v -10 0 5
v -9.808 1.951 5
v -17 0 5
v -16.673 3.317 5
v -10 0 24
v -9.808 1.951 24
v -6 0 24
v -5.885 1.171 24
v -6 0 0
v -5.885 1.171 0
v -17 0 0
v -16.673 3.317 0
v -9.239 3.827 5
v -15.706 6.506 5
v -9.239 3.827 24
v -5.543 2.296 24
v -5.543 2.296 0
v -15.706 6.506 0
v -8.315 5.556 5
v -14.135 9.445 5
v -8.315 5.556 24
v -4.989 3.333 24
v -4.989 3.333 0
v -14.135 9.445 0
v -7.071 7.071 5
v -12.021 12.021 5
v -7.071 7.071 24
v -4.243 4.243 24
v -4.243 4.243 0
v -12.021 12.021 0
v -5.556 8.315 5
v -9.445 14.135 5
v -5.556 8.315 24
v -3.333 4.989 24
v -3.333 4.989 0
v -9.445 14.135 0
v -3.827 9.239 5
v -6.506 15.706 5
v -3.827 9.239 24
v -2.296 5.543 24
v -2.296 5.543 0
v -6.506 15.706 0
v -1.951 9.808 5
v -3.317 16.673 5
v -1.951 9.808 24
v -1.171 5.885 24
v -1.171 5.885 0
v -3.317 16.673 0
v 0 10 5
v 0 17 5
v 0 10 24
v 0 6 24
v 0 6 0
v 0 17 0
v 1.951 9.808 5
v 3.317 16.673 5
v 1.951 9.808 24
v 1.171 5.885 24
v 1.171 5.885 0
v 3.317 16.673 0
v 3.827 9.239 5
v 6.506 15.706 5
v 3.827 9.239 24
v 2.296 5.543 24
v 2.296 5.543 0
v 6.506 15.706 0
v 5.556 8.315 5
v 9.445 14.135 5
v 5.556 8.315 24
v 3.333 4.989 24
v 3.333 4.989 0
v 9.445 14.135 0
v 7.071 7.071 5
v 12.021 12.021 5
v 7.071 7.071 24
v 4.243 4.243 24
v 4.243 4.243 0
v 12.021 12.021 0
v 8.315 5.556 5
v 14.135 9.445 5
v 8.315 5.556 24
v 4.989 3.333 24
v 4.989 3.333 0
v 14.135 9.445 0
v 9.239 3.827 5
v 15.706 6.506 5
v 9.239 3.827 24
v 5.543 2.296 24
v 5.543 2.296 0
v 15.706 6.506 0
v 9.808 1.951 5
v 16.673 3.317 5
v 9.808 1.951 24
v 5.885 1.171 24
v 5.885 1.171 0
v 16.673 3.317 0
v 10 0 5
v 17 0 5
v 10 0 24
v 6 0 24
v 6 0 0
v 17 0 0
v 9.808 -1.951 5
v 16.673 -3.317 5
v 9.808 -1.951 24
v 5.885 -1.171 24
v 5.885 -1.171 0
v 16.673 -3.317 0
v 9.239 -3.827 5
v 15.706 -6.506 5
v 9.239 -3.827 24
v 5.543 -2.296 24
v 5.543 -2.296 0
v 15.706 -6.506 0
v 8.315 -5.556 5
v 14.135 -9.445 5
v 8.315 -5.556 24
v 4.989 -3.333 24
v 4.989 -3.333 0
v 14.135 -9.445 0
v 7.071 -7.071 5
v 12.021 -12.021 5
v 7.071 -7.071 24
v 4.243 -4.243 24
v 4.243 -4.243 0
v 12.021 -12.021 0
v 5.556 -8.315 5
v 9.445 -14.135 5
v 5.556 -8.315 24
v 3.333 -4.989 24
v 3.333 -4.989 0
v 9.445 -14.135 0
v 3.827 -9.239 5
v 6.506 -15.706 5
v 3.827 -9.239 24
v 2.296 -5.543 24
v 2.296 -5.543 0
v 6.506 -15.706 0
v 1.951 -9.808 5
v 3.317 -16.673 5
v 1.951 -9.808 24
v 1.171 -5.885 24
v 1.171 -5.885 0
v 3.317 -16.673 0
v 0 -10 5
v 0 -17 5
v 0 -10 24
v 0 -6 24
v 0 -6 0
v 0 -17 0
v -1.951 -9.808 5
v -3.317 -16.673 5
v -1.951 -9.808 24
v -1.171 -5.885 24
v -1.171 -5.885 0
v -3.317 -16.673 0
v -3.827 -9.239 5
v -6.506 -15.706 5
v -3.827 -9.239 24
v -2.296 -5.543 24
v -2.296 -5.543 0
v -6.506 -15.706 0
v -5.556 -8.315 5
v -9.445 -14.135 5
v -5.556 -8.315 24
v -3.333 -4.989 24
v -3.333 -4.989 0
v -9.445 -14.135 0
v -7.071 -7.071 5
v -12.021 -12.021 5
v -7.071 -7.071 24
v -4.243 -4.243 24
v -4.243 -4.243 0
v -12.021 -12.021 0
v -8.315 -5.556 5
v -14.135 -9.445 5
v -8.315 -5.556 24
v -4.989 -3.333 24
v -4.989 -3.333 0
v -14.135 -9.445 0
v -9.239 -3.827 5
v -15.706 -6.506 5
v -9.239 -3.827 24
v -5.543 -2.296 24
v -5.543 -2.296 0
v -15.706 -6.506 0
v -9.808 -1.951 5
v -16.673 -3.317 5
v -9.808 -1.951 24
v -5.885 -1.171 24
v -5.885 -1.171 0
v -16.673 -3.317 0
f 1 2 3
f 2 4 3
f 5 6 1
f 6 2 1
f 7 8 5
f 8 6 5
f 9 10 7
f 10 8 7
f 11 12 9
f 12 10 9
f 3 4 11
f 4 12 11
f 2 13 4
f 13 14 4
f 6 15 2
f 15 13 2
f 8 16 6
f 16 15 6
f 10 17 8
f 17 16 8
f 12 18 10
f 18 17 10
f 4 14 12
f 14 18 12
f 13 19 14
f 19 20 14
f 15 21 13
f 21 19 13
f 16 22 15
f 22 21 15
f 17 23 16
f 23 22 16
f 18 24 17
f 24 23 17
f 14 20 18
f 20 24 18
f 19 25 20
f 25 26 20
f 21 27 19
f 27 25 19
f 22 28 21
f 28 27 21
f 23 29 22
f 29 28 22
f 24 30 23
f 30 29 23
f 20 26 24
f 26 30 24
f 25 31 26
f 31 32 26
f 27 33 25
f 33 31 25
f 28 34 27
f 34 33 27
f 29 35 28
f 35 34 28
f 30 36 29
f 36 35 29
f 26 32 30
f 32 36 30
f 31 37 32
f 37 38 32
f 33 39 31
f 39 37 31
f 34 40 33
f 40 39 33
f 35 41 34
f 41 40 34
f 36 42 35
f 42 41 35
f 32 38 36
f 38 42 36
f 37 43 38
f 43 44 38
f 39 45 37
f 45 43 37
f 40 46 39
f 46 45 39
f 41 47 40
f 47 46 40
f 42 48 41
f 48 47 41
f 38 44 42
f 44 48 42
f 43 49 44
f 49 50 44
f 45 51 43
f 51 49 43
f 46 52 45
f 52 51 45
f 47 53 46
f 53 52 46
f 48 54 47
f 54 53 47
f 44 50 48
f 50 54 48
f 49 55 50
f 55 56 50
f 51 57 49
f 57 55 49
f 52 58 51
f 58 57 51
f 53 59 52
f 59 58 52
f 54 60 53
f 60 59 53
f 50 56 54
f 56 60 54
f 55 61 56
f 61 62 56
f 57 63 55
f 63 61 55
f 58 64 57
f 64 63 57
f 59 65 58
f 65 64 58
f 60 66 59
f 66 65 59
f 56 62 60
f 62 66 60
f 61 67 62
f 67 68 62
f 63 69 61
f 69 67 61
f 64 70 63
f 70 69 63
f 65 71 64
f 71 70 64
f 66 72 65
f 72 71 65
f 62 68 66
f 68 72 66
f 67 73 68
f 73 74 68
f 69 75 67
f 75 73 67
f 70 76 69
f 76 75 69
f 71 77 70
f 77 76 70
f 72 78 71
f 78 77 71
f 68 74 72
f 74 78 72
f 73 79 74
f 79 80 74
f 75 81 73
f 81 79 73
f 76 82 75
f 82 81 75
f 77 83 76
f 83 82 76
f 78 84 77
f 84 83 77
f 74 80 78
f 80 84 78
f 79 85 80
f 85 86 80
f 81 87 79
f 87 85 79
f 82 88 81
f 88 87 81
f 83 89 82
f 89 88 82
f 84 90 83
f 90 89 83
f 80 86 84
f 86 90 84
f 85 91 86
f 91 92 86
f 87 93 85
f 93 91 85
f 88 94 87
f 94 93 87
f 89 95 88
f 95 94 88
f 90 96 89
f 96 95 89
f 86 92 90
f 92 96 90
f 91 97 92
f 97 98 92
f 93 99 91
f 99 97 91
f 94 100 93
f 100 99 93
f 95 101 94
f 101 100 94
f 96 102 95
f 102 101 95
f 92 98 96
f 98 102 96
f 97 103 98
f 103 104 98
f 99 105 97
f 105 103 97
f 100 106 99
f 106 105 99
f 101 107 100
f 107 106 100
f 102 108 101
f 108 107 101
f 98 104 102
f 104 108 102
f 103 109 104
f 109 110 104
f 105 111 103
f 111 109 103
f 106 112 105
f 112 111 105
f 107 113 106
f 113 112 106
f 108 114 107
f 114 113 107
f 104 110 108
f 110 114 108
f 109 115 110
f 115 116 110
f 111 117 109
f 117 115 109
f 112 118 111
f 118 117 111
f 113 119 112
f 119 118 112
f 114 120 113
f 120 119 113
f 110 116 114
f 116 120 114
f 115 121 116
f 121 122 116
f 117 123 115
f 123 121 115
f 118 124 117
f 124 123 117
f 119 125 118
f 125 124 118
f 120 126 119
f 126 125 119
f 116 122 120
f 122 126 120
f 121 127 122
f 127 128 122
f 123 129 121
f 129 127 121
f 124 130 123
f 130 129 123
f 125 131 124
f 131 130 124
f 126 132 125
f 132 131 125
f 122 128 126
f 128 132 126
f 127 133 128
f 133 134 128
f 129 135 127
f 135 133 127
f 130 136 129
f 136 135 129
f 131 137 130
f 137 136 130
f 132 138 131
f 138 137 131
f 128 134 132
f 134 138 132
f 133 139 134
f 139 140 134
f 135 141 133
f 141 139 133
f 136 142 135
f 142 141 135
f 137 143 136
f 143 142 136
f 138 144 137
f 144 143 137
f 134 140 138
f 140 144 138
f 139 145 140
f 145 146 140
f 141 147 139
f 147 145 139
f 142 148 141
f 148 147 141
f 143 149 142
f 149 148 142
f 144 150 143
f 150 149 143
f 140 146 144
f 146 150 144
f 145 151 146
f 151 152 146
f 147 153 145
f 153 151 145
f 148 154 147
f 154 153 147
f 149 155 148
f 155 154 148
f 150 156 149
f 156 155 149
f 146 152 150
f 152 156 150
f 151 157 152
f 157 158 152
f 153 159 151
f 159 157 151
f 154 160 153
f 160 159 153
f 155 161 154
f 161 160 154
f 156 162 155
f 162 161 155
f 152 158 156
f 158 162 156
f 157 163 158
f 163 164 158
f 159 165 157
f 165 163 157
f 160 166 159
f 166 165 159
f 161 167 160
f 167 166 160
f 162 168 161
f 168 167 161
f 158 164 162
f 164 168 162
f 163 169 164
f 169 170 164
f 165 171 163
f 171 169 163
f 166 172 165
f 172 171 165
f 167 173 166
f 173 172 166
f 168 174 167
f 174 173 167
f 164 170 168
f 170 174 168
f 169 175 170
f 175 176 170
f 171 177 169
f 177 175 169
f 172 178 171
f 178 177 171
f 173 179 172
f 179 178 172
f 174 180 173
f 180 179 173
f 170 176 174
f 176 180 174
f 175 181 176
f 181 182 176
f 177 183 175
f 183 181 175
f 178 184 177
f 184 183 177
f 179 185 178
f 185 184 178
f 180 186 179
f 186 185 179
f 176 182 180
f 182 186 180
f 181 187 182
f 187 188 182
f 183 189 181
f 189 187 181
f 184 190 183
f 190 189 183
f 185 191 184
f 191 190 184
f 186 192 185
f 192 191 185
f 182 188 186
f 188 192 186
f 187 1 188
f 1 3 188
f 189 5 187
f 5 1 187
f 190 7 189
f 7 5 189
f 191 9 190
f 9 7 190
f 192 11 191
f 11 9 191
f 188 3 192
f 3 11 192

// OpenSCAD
$fn = 32;

// ----------------------------------------------------------------------
// Arc stop: collar, 24 mm thick
// ----------------------------------------------------------------------

// --- parameters (mm) ---
revolve_angle = 360;      // full turn around the Z axis
profile_points = 6;       // points of the closed outline

profile = [[6, 0], [17, 0], [17, 5], [10, 5], [10, 24], [6, 24]];  // single closed polygon, 6 points, counter clockwise

// --- the one profile operation ---
rotate_extrude(angle = revolve_angle) polygon(points = profile);
